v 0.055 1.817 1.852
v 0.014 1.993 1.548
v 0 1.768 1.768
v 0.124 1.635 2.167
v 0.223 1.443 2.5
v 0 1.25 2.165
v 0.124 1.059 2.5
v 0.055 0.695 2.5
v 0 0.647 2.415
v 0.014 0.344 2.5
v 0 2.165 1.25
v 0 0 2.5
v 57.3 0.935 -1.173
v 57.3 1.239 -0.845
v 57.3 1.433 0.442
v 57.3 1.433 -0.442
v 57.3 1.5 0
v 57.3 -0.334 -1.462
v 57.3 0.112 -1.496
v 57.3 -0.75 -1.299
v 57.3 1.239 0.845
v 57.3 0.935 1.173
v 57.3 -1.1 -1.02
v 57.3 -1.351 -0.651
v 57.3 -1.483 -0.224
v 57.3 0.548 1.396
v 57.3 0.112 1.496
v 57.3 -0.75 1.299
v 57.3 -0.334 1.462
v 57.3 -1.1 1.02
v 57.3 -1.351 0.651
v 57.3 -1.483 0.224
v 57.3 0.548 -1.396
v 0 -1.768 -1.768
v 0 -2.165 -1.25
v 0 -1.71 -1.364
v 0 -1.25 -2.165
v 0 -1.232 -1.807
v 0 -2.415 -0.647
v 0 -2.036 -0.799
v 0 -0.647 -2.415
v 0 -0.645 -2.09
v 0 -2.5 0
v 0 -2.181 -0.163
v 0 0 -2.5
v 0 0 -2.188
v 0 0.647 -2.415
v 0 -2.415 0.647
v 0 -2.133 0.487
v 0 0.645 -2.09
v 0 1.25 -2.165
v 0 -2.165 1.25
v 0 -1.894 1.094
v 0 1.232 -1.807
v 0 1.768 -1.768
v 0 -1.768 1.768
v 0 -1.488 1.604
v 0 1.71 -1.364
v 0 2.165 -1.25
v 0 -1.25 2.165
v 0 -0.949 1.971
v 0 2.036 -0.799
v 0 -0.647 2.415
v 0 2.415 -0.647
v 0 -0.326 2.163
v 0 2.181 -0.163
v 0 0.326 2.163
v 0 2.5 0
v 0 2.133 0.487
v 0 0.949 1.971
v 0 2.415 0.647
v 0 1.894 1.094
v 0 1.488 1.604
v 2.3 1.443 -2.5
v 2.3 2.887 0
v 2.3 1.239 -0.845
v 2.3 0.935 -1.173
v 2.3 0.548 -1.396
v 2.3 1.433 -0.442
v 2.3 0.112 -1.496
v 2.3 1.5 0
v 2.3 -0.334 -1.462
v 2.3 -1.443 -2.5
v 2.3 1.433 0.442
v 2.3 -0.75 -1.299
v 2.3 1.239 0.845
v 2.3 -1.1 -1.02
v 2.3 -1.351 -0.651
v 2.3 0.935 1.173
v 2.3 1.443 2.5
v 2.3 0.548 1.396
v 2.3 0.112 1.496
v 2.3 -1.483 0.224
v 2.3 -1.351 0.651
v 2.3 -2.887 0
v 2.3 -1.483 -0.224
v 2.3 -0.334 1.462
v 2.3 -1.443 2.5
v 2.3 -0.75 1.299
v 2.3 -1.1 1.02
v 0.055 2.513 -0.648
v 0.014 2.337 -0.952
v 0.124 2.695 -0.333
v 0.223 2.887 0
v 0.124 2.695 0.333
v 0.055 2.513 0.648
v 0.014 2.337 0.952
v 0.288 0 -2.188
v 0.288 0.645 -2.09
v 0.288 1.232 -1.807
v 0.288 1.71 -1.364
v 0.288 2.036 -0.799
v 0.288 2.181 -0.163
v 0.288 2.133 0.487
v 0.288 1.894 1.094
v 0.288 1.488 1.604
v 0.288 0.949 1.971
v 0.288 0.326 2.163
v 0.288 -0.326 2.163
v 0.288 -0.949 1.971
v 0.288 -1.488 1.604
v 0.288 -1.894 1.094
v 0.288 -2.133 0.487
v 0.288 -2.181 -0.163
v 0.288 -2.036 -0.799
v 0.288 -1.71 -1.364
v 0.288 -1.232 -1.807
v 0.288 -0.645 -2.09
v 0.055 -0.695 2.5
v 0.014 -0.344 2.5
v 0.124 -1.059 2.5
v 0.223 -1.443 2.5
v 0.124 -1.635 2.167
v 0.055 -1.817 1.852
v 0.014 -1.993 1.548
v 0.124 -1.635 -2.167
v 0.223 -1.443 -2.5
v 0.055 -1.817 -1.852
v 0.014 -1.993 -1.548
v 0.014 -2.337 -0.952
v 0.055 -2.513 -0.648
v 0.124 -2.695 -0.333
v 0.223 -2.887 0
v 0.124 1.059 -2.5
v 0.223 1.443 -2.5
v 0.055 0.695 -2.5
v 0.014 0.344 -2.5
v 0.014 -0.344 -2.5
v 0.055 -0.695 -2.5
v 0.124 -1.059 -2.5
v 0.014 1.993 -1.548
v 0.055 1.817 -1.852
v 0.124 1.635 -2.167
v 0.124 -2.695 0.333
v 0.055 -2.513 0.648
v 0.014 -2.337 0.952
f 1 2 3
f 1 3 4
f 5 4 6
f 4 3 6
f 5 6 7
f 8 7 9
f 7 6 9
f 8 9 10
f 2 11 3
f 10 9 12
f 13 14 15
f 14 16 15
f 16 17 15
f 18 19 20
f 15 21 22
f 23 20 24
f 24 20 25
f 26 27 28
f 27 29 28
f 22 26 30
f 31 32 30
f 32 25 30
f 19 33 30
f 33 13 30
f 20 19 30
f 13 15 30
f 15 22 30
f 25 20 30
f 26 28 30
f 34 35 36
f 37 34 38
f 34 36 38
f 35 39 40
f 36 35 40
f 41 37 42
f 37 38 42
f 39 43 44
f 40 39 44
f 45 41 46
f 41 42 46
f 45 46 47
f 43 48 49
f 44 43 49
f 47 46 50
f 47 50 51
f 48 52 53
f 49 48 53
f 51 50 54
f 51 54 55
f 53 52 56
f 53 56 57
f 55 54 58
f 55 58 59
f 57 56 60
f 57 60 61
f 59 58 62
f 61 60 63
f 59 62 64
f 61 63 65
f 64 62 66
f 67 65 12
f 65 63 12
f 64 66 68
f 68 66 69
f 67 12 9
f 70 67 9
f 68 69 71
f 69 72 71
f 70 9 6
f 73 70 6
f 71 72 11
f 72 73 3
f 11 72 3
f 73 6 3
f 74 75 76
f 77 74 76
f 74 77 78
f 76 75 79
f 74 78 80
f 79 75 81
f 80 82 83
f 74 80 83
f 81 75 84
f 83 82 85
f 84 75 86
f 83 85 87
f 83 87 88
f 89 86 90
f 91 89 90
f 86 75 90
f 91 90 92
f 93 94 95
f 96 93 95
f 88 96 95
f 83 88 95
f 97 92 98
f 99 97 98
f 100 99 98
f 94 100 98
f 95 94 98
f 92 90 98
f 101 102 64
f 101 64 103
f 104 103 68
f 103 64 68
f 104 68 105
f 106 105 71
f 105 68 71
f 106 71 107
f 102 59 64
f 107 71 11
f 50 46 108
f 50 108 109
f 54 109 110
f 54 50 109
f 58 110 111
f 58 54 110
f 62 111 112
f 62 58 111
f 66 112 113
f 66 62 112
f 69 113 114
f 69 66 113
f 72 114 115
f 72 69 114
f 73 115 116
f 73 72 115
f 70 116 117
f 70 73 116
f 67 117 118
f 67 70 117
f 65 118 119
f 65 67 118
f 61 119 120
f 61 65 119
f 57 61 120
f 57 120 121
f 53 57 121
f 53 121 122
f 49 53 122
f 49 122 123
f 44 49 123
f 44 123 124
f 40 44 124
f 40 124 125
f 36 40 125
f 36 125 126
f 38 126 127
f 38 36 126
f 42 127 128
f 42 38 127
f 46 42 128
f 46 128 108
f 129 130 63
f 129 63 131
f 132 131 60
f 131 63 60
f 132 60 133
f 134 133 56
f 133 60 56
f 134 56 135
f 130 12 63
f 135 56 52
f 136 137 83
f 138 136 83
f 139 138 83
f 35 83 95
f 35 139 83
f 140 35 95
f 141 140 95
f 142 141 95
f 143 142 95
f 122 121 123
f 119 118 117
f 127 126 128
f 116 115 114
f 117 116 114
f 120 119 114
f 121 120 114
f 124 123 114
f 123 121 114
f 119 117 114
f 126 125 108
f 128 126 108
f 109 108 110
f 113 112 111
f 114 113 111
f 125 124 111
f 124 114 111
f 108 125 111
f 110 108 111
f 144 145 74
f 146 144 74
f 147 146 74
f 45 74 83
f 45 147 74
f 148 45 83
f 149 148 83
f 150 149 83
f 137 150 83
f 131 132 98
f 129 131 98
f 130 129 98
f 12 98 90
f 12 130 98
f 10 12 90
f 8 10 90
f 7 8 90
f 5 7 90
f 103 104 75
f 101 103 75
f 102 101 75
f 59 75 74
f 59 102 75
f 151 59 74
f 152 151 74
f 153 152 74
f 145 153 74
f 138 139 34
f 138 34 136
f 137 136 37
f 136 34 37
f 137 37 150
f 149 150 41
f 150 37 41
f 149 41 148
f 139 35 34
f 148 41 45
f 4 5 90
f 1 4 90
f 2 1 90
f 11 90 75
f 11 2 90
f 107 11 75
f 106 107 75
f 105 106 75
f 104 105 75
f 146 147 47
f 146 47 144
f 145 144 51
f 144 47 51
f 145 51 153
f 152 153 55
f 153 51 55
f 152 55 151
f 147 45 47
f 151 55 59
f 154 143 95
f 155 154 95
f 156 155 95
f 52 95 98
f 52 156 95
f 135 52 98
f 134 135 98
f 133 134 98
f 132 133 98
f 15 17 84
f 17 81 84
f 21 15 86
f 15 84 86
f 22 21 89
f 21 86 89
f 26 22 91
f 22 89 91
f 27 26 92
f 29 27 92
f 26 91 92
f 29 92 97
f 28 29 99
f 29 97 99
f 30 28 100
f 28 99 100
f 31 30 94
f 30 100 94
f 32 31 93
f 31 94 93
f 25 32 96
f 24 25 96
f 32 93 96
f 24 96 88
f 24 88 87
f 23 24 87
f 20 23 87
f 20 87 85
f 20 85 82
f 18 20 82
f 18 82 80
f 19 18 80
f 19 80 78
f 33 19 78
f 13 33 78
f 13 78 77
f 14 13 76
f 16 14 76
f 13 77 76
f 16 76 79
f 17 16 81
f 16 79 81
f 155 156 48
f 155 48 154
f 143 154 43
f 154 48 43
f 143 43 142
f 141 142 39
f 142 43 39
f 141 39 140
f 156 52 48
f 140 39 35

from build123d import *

# Parameters (mm, degrees)
SKETCH2_R     = 2.915704388
HEX_DIE_DEPTH = 2.3
SKETCH4_R     = 2.1875
INDENT_DEPTH  = 0.2875


with BuildPart() as part:
    # BodySke → Base-Revolve (revolve)
    with BuildSketch(Plane.XY):
        Polygon((2.3, 1.5), (2.3, 2.886836028), (0.223339885, 2.886836028), (0, 2.5), (0, 0), (57.3, 0), (57.3, 1.5), align=None)
    revolve(axis=Axis((-25.4, 0, 0), (1, 0, 0)))

    # Sketch2 → Hex-Die (cut)
    with BuildSketch(Plane(origin=(0, 0, 0), x_dir=(0, 0, -1), z_dir=(1, 0, 0))):
        Circle(SKETCH2_R)
        Polygon((-2.5, 1.443375679), (0, 2.886751359), (2.5, 1.443375679), (2.5, -1.443375679), (0, -2.886751359), (-2.5, -1.443375679), align=None, mode=Mode.SUBTRACT)
    extrude(amount=HEX_DIE_DEPTH, mode=Mode.SUBTRACT)

    # Sketch4 → Indent (cut)
    with BuildSketch(Plane(origin=(0, 0, 0), x_dir=(0, 0, -1), z_dir=(1, 0, 0))):
        Circle(SKETCH4_R)
    extrude(amount=INDENT_DEPTH, mode=Mode.SUBTRACT)


solid = part.part
